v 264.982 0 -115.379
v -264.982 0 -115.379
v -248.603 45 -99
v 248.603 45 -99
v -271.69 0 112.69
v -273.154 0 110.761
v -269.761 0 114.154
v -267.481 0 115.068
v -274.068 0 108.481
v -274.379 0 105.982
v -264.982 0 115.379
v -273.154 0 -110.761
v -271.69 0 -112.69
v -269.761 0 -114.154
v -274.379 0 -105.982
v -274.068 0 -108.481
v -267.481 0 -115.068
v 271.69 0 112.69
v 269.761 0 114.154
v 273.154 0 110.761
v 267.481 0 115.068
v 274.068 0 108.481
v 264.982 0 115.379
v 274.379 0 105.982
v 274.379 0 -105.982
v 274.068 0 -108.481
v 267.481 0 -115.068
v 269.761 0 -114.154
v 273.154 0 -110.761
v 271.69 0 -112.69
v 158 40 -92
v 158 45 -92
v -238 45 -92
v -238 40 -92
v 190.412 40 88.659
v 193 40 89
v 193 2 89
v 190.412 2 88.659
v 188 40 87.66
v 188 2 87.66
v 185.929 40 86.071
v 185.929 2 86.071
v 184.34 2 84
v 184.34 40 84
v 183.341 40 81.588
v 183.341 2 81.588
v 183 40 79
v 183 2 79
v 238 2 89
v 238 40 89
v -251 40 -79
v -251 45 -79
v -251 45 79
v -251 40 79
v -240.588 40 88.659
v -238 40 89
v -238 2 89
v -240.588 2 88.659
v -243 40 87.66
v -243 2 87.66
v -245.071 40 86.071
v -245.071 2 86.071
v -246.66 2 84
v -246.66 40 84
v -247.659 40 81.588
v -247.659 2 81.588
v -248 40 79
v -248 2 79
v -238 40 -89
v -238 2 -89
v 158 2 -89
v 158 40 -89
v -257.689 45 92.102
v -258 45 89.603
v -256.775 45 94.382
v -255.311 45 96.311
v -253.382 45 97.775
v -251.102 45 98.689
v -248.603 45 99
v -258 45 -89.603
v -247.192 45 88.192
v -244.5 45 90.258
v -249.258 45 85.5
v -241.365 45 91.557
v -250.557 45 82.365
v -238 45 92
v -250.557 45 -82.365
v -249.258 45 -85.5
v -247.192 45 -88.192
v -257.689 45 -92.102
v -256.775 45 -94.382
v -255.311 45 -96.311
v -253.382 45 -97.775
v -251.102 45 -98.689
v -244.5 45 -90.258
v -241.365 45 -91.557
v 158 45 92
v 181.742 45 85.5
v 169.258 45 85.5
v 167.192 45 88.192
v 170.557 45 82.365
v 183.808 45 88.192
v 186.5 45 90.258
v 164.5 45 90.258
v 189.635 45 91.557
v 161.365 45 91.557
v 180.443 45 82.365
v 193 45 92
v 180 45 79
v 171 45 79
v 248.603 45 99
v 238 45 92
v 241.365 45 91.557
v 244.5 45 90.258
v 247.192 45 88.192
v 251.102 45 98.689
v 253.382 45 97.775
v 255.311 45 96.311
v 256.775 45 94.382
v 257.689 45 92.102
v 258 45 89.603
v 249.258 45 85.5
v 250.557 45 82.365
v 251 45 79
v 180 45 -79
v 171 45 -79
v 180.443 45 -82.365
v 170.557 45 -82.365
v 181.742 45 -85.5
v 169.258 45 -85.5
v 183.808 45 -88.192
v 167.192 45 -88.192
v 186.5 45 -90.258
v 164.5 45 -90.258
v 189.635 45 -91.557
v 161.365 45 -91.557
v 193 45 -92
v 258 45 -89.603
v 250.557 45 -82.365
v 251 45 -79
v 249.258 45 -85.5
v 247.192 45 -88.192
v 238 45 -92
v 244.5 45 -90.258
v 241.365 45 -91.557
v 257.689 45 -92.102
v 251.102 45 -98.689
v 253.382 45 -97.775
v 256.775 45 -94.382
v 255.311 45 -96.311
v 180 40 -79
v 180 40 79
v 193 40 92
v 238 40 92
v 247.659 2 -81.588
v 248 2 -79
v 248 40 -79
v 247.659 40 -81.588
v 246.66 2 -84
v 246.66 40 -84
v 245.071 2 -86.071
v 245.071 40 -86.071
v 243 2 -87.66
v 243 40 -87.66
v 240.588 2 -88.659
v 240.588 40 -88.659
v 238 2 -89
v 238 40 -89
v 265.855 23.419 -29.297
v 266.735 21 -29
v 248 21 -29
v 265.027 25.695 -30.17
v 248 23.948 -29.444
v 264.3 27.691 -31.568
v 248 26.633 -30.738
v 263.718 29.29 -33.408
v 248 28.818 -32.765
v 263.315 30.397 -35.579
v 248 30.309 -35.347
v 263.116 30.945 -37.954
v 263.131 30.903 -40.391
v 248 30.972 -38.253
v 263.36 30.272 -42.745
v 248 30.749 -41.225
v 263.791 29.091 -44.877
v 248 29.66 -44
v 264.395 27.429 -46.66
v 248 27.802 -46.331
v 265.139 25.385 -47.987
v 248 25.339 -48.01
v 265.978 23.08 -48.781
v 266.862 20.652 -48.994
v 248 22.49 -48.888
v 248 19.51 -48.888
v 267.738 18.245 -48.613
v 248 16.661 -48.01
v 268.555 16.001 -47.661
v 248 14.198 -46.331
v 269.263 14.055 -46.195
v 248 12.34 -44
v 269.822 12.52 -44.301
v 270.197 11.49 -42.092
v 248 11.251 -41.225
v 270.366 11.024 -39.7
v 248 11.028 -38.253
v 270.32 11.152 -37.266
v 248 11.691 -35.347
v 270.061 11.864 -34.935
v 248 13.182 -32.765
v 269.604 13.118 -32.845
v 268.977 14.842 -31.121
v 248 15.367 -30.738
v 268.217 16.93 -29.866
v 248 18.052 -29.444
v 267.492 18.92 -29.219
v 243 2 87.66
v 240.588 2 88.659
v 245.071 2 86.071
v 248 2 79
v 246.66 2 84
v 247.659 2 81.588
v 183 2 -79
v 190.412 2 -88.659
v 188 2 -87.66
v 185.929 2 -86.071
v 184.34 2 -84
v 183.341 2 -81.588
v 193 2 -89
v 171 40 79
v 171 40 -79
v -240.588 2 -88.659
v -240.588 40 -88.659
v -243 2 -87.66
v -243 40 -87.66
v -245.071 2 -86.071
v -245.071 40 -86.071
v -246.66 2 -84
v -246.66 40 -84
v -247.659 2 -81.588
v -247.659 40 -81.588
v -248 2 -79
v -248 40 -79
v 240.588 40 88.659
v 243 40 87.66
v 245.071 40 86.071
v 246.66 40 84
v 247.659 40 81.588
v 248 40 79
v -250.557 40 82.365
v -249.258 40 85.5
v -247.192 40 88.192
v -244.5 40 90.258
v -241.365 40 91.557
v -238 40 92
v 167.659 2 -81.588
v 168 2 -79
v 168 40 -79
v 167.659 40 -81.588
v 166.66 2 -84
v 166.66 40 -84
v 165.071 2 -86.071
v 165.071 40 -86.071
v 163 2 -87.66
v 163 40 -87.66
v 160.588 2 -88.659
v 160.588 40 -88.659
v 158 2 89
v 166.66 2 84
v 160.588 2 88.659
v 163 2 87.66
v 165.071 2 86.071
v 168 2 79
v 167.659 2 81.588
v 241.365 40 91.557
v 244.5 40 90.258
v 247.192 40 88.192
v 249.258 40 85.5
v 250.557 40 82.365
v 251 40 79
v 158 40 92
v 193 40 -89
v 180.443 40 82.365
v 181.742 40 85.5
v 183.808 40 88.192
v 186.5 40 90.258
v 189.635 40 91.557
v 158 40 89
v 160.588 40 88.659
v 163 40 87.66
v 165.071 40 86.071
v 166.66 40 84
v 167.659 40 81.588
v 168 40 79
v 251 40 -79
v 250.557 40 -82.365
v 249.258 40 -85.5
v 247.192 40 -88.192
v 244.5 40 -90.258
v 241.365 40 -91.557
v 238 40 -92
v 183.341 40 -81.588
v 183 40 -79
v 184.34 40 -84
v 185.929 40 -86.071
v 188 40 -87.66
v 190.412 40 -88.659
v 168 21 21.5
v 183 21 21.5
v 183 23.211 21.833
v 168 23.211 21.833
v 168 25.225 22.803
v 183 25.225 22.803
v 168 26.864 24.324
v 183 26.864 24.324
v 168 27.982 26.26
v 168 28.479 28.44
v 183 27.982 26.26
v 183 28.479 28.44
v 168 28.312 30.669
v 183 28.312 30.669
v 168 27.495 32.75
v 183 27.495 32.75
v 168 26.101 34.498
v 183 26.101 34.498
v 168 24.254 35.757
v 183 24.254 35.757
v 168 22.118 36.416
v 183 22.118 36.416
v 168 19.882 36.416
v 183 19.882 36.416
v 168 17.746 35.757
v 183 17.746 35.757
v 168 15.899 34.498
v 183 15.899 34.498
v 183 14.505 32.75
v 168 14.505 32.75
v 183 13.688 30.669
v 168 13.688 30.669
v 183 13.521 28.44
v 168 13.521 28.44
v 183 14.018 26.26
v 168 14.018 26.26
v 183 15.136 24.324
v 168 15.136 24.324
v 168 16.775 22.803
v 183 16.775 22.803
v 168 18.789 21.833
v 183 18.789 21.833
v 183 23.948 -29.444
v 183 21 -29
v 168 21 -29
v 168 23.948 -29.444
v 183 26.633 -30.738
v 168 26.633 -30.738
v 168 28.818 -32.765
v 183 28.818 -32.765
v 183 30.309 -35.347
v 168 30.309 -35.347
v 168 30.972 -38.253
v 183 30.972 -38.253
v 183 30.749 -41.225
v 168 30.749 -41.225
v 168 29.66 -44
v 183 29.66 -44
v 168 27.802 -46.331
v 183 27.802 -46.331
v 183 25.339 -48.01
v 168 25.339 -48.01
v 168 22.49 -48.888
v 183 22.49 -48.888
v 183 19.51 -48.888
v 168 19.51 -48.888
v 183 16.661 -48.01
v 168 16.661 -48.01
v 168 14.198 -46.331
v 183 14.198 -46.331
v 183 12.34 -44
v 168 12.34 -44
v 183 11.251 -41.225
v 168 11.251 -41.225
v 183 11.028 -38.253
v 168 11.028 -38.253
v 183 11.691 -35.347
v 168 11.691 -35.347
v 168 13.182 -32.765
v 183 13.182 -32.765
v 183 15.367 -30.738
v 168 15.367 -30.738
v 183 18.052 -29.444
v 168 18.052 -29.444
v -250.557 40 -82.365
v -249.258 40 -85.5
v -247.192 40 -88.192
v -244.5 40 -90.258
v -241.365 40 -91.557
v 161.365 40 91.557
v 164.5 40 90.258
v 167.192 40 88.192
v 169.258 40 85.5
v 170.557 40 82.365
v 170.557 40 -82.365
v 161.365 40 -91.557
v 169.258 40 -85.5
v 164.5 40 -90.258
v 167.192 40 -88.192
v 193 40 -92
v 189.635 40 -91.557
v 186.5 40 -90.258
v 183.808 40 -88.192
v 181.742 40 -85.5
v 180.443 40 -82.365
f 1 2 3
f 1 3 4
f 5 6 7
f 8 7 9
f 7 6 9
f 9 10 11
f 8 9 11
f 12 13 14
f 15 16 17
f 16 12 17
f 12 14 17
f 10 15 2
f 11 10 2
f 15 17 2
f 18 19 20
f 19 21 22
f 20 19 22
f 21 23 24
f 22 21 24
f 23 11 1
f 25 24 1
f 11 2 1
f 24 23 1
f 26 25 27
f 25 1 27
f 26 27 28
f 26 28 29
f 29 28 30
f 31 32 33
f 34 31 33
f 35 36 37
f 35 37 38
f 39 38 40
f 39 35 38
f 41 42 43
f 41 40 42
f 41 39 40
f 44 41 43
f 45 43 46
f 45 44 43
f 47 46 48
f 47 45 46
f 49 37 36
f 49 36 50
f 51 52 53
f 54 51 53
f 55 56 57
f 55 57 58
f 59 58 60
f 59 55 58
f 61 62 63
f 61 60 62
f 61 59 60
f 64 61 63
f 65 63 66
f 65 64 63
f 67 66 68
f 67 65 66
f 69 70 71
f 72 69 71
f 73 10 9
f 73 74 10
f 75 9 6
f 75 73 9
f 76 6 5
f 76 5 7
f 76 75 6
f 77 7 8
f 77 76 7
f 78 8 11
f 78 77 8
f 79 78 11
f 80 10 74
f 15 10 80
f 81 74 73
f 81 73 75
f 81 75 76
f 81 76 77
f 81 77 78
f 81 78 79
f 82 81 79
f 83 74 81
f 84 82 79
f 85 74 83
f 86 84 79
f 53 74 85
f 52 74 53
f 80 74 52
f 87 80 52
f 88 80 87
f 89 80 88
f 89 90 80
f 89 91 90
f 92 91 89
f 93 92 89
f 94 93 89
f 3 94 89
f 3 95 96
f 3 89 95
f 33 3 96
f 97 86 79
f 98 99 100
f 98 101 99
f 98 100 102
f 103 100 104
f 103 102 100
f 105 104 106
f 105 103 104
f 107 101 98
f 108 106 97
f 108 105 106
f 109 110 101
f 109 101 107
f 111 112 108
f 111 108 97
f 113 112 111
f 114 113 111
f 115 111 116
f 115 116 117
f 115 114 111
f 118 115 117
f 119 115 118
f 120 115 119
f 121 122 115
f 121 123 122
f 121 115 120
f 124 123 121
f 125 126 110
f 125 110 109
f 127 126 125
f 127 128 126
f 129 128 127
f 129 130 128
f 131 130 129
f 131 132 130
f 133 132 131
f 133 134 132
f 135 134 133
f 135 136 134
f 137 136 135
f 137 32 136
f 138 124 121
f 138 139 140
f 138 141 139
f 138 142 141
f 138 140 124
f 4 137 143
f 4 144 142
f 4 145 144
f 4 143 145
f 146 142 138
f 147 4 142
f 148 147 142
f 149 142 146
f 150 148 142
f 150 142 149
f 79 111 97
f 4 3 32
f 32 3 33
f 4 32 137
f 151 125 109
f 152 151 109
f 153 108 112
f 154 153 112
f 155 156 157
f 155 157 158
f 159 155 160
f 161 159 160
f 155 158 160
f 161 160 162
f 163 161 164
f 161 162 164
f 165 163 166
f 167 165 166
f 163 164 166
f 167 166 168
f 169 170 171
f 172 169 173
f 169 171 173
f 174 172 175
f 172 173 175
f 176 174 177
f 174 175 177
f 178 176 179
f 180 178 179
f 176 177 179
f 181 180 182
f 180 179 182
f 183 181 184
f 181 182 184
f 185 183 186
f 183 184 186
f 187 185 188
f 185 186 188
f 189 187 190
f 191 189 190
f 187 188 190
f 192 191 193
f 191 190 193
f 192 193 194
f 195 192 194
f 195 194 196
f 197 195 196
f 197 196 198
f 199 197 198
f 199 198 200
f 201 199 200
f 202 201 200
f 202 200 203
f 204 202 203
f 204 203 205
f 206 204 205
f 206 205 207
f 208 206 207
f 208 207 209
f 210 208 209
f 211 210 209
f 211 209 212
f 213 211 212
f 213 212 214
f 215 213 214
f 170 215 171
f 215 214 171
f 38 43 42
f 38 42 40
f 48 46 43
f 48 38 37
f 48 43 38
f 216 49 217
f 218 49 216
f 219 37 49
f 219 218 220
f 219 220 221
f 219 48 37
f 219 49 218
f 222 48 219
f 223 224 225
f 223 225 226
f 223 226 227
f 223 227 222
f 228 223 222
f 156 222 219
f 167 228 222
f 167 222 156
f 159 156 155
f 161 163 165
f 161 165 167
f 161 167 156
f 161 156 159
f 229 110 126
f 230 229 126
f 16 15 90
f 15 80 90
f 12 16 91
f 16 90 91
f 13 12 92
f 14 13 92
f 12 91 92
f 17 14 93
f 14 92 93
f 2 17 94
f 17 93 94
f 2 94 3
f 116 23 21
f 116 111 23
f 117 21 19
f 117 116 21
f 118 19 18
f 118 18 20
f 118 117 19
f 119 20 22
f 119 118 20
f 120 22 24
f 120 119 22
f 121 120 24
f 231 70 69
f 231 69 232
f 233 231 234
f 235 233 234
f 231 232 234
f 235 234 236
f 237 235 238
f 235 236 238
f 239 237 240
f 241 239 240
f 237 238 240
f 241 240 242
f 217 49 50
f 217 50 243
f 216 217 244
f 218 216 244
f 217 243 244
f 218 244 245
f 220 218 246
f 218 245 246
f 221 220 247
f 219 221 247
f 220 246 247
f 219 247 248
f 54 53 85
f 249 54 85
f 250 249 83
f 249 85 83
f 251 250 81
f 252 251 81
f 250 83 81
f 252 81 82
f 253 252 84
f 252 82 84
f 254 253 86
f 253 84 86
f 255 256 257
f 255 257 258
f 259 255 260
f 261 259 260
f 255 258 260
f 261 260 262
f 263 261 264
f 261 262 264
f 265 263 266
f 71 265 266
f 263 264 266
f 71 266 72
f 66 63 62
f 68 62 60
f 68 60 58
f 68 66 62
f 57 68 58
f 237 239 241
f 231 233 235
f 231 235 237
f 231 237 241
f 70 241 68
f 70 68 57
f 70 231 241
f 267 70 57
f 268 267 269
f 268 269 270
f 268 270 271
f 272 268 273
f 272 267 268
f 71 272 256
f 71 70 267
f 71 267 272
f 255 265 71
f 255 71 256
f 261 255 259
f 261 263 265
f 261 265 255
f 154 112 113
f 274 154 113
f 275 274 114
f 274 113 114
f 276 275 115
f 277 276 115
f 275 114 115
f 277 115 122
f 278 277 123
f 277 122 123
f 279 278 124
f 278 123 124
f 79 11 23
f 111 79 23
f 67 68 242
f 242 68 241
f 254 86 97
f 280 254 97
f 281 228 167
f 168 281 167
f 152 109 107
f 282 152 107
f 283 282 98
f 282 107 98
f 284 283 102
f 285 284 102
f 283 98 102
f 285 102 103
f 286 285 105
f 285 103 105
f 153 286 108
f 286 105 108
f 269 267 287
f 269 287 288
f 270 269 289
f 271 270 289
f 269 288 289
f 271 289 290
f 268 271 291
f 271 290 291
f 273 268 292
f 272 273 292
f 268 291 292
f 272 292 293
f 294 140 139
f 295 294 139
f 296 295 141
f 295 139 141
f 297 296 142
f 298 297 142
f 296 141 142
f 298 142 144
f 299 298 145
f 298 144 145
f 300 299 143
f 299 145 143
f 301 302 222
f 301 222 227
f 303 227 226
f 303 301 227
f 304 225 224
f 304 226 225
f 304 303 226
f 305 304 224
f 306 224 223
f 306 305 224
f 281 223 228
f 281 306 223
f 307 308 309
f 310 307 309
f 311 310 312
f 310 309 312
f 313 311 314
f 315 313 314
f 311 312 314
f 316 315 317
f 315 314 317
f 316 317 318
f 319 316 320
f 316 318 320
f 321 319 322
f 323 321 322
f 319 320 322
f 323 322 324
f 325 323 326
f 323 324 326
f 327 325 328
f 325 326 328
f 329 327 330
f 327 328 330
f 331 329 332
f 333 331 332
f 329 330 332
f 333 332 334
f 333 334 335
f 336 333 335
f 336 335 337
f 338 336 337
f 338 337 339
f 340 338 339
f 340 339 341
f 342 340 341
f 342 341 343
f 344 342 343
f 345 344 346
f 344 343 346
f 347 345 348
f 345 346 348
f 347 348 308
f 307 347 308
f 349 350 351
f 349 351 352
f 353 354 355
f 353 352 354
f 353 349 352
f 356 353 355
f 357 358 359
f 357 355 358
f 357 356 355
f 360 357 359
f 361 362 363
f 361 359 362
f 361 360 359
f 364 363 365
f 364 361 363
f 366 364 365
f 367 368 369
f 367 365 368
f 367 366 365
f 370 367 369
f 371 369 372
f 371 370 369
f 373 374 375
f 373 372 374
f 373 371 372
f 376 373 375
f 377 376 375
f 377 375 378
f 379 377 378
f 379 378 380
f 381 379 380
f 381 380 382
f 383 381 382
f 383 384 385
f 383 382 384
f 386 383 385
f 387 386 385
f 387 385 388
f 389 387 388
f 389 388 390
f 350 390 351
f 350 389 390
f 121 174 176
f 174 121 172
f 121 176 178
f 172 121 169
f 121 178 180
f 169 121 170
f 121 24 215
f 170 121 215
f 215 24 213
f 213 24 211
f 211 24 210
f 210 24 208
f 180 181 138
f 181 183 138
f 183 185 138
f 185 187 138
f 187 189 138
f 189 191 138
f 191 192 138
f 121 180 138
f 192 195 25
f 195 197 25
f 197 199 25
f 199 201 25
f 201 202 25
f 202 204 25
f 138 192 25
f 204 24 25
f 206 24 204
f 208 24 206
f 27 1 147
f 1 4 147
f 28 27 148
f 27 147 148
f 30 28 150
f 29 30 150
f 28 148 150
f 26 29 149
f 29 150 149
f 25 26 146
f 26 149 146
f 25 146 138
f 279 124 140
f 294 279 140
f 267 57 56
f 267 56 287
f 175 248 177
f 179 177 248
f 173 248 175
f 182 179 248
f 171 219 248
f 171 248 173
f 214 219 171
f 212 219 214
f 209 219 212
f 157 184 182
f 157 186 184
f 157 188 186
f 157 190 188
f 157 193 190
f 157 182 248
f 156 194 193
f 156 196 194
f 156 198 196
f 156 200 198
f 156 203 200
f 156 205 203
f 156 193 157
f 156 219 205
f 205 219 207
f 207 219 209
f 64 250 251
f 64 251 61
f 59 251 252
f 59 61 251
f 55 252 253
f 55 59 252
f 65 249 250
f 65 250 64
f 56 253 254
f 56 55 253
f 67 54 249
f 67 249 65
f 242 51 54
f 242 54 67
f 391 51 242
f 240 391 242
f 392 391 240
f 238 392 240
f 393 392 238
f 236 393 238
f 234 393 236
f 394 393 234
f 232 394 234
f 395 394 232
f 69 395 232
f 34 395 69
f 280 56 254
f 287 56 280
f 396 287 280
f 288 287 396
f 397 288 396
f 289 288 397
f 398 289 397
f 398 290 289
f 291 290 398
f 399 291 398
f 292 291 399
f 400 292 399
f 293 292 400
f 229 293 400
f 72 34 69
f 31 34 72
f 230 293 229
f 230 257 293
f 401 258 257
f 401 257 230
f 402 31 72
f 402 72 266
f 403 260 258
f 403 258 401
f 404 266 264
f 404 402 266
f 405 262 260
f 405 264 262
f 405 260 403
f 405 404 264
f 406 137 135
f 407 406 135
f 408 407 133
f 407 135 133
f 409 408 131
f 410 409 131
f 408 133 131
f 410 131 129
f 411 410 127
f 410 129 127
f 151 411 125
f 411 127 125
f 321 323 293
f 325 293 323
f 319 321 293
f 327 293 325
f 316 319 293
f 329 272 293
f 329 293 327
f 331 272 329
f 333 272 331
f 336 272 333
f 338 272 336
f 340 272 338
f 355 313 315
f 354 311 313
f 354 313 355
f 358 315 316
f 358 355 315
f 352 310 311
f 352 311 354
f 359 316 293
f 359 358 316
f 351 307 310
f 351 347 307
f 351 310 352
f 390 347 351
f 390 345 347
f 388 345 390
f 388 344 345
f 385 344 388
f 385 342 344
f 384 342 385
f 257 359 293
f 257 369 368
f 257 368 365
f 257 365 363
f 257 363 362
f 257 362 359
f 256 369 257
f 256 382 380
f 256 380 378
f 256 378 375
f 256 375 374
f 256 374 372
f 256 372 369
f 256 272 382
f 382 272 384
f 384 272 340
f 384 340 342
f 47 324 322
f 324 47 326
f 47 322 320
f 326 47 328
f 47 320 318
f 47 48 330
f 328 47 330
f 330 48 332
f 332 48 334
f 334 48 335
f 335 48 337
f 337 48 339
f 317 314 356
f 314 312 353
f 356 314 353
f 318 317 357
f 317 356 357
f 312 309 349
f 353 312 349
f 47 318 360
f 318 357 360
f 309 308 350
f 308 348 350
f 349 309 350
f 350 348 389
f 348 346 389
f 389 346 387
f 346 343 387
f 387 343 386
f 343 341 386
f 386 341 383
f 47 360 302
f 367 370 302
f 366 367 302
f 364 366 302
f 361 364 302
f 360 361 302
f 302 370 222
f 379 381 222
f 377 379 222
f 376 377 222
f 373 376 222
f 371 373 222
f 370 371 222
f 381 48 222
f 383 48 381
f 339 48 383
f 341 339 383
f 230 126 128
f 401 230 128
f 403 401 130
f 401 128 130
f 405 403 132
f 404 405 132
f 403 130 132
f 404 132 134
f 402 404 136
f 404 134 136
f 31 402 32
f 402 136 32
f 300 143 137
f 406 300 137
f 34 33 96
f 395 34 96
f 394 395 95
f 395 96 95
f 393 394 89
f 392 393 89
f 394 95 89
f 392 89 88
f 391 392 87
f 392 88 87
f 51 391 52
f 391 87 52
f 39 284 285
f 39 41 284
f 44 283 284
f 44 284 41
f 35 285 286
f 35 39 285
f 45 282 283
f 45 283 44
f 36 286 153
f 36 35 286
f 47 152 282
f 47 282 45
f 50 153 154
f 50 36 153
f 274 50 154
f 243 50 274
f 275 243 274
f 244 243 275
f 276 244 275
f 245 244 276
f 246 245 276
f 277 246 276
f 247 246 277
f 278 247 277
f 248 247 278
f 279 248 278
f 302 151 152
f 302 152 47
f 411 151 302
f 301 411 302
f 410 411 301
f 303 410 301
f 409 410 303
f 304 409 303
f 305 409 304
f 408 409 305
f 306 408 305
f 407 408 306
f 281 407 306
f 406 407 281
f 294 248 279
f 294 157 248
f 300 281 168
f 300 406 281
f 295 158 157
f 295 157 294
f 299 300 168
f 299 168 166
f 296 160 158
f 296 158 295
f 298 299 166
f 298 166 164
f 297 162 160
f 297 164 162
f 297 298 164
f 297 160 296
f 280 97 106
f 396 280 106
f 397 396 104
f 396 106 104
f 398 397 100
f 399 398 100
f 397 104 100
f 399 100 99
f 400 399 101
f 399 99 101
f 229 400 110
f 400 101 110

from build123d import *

# Parameters (mm, degrees)
SKETCH2_W                      = 516
SKETCH2_H                      = 198
SKETCH2_W_2                    = 65
SKETCH2_H_2                    = 178
SKETCH2_W_3                    = 416
BOSS_EXTRUDE2_DEPTH            = 45
DRAFT3_ANGLE                   = 20
FILLET1_R                      = 10
SKETCH2_3_W                    = 416
SKETCH2_3_H                    = 178
SKETCH2_3_W_2                  = 350
SKETCH2_3_H_2                  = 80
SKETCH2_3_W_3                  = 376
SKETCH2_3_H_3                  = 68
SKETCH2_3_W_4                  = 65
BOSS_EXTRUDE3_DEPTH            = 2
CUT_EXTRUDE1_DEPTH             = 5
CUT_EXTRUDE2_REACH             = 538.858
SKETCH4_R                      = 10
CUT_EXTRUDE2_DIRECTION_2_DEPTH = 54
SKETCH5_R                      = 7.5
CUT_EXTRUDE3_DEPTH             = 15


with BuildPart() as part:
    # Sketch2 → Boss-Extrude2 (new body)
    with BuildSketch(Plane(origin=(0, 0, 0), x_dir=(1, 0, 0), z_dir=(0, 1, 0))):
        Rectangle(SKETCH2_W, SKETCH2_H)
        with Locations((215.5, 0)):
            Rectangle(SKETCH2_W_2, SKETCH2_H_2, mode=Mode.SUBTRACT)
        with Locations((-40, 0)):
            Rectangle(SKETCH2_W_3, SKETCH2_H_2, mode=Mode.SUBTRACT)
    extrude(amount=BOSS_EXTRUDE2_DEPTH)

    # Draft3
    draft3_faces = [part.faces().sort_by_distance(p)[0] for p in [
        (0, 22.5, -99),
        (258, 22.5, 0),
        (0, 22.5, 99),
        (-258, 22.5, 0),
    ]]
    draft(draft3_faces, Plane.ZX.offset(45), DRAFT3_ANGLE)

    # Fillet1
    fillet1_edges = [part.edges().sort_by_distance(p)[0] for p in [
        (-248, 22.5, 89),
        (168, 22.5, 89),
        (168, 22.5, -89),
        (-248, 22.5, -89),
        (-266.189330271, 22.5, -107.189330271),
        (266.189330271, 22.5, -107.189330271),
        (266.189330271, 22.5, 107.189330271),
        (-266.189330271, 22.5, 107.189330271),
        (248, 22.5, 89),
        (248, 22.5, -89),
        (183, 22.5, -89),
        (183, 22.5, 89),
    ]]
    fillet(fillet1_edges, radius=FILLET1_R)

    # Sketch2<3> → Boss-Extrude3 (add)
    # profile 1 of 4: a face of its own
    with BuildSketch(Plane(origin=(0, 0, 0), x_dir=(1, 0, 0), z_dir=(0, 1, 0))):
        with Locations((-40, 0)):
            Rectangle(SKETCH2_3_W, SKETCH2_3_H)
        with Locations((-63, 44)):
            Rectangle(SKETCH2_3_W_2, SKETCH2_3_H_2, mode=Mode.SUBTRACT)
        with Locations((-50, -45)):
            Rectangle(SKETCH2_3_W_3, SKETCH2_3_H_3, mode=Mode.SUBTRACT)
    # profile 2 of 4: a face of its own
    with BuildSketch(Plane(origin=(0, 0, 0), x_dir=(1, 0, 0), z_dir=(0, 1, 0))):
        with Locations((-50, -45)):
            Rectangle(SKETCH2_3_W_3, SKETCH2_3_H_3)
    # profile 3 of 4: a face of its own
    with BuildSketch(Plane(origin=(0, 0, 0), x_dir=(1, 0, 0), z_dir=(0, 1, 0))):
        with Locations((-63, 44)):
            Rectangle(SKETCH2_3_W_2, SKETCH2_3_H_2)
    # profile 4 of 4: a face of its own
    with BuildSketch(Plane(origin=(0, 0, 0), x_dir=(1, 0, 0), z_dir=(0, 1, 0))):
        with Locations((215.5, 0)):
            Rectangle(SKETCH2_3_W_4, SKETCH2_3_H)
    extrude(amount=BOSS_EXTRUDE3_DEPTH)

    # Sketch3 → Cut-Extrude1 (cut)
    with BuildSketch(Plane(origin=(0, 45, 0), x_dir=(1, 0, 0), z_dir=(0, 1, 0))):
        with BuildLine():
            Line((171, -79), (171, 79))
            ThreePointArc((171, 79), (167.192388155, 88.192388155), (158, 92))
            Line((158, 92), (-238, 92))
            ThreePointArc((-238, 92), (-247.192388155, 88.192388155), (-251, 79))
            Line((-251, 79), (-251, -79))
            ThreePointArc((-251, -79), (-247.192388155, -88.192388155), (-238, -92))
            Line((-238, -92), (158, -92))
            ThreePointArc((158, -92), (167.192388155, -88.192388155), (171, -79))
        make_face()
        with BuildLine():
            Line((193, -92), (238, -92))
            ThreePointArc((238, -92), (247.192388155, -88.192388155), (251, -79))
            Line((251, -79), (251, 79))
            ThreePointArc((251, 79), (247.192388155, 88.192388155), (238, 92))
            Line((238, 92), (193, 92))
            ThreePointArc((193, 92), (183.807611845, 88.192388155), (180, 79))
            Line((180, 79), (180, -79))
            ThreePointArc((180, -79), (183.807611845, -88.192388155), (193, -92))
        make_face()
    extrude(amount=-CUT_EXTRUDE1_DEPTH, mode=Mode.SUBTRACT)

    # Cut-Extrude2: up to this face of the body (flat: up to its plane)
    cut_extrude2_end = Plane(part.part.faces().sort_by_distance((168, 21, 0))[0])
    # Sketch4 → Cut-Extrude2 (cut, up to the picked face)
    with BuildSketch(Plane.ZY.offset(-248), mode=Mode.PRIVATE) as cut_extrude2_sk1:
        with Locations((-39, 21)):
            Circle(SKETCH4_R)
    cut_extrude2_tool1 = split(extrude(cut_extrude2_sk1.sketch, amount=CUT_EXTRUDE2_REACH, mode=Mode.PRIVATE), bisect_by=cut_extrude2_end, keep=Keep.BOTH, mode=Mode.PRIVATE)
    add(cut_extrude2_tool1.solids().sort_by(Axis((248, 21, -39), (-1, 0, 0)))[0], mode=Mode.SUBTRACT)

    # Sketch4 → Cut-Extrude2 direction 2 (cut)
    with BuildSketch(Plane.ZY.offset(-248)):
        with Locations((-39, 21)):
            Circle(SKETCH4_R)
    extrude(amount=-CUT_EXTRUDE2_DIRECTION_2_DEPTH, mode=Mode.SUBTRACT)

    # Sketch5 → Cut-Extrude3 (cut)
    with BuildSketch(Plane(origin=(183, 0, 0), x_dir=(0, 0, -1), z_dir=(1, 0, 0))):
        with Locations((-29, 21)):
            Circle(SKETCH5_R)
    extrude(amount=-CUT_EXTRUDE3_DEPTH, mode=Mode.SUBTRACT)


solid = part.part
